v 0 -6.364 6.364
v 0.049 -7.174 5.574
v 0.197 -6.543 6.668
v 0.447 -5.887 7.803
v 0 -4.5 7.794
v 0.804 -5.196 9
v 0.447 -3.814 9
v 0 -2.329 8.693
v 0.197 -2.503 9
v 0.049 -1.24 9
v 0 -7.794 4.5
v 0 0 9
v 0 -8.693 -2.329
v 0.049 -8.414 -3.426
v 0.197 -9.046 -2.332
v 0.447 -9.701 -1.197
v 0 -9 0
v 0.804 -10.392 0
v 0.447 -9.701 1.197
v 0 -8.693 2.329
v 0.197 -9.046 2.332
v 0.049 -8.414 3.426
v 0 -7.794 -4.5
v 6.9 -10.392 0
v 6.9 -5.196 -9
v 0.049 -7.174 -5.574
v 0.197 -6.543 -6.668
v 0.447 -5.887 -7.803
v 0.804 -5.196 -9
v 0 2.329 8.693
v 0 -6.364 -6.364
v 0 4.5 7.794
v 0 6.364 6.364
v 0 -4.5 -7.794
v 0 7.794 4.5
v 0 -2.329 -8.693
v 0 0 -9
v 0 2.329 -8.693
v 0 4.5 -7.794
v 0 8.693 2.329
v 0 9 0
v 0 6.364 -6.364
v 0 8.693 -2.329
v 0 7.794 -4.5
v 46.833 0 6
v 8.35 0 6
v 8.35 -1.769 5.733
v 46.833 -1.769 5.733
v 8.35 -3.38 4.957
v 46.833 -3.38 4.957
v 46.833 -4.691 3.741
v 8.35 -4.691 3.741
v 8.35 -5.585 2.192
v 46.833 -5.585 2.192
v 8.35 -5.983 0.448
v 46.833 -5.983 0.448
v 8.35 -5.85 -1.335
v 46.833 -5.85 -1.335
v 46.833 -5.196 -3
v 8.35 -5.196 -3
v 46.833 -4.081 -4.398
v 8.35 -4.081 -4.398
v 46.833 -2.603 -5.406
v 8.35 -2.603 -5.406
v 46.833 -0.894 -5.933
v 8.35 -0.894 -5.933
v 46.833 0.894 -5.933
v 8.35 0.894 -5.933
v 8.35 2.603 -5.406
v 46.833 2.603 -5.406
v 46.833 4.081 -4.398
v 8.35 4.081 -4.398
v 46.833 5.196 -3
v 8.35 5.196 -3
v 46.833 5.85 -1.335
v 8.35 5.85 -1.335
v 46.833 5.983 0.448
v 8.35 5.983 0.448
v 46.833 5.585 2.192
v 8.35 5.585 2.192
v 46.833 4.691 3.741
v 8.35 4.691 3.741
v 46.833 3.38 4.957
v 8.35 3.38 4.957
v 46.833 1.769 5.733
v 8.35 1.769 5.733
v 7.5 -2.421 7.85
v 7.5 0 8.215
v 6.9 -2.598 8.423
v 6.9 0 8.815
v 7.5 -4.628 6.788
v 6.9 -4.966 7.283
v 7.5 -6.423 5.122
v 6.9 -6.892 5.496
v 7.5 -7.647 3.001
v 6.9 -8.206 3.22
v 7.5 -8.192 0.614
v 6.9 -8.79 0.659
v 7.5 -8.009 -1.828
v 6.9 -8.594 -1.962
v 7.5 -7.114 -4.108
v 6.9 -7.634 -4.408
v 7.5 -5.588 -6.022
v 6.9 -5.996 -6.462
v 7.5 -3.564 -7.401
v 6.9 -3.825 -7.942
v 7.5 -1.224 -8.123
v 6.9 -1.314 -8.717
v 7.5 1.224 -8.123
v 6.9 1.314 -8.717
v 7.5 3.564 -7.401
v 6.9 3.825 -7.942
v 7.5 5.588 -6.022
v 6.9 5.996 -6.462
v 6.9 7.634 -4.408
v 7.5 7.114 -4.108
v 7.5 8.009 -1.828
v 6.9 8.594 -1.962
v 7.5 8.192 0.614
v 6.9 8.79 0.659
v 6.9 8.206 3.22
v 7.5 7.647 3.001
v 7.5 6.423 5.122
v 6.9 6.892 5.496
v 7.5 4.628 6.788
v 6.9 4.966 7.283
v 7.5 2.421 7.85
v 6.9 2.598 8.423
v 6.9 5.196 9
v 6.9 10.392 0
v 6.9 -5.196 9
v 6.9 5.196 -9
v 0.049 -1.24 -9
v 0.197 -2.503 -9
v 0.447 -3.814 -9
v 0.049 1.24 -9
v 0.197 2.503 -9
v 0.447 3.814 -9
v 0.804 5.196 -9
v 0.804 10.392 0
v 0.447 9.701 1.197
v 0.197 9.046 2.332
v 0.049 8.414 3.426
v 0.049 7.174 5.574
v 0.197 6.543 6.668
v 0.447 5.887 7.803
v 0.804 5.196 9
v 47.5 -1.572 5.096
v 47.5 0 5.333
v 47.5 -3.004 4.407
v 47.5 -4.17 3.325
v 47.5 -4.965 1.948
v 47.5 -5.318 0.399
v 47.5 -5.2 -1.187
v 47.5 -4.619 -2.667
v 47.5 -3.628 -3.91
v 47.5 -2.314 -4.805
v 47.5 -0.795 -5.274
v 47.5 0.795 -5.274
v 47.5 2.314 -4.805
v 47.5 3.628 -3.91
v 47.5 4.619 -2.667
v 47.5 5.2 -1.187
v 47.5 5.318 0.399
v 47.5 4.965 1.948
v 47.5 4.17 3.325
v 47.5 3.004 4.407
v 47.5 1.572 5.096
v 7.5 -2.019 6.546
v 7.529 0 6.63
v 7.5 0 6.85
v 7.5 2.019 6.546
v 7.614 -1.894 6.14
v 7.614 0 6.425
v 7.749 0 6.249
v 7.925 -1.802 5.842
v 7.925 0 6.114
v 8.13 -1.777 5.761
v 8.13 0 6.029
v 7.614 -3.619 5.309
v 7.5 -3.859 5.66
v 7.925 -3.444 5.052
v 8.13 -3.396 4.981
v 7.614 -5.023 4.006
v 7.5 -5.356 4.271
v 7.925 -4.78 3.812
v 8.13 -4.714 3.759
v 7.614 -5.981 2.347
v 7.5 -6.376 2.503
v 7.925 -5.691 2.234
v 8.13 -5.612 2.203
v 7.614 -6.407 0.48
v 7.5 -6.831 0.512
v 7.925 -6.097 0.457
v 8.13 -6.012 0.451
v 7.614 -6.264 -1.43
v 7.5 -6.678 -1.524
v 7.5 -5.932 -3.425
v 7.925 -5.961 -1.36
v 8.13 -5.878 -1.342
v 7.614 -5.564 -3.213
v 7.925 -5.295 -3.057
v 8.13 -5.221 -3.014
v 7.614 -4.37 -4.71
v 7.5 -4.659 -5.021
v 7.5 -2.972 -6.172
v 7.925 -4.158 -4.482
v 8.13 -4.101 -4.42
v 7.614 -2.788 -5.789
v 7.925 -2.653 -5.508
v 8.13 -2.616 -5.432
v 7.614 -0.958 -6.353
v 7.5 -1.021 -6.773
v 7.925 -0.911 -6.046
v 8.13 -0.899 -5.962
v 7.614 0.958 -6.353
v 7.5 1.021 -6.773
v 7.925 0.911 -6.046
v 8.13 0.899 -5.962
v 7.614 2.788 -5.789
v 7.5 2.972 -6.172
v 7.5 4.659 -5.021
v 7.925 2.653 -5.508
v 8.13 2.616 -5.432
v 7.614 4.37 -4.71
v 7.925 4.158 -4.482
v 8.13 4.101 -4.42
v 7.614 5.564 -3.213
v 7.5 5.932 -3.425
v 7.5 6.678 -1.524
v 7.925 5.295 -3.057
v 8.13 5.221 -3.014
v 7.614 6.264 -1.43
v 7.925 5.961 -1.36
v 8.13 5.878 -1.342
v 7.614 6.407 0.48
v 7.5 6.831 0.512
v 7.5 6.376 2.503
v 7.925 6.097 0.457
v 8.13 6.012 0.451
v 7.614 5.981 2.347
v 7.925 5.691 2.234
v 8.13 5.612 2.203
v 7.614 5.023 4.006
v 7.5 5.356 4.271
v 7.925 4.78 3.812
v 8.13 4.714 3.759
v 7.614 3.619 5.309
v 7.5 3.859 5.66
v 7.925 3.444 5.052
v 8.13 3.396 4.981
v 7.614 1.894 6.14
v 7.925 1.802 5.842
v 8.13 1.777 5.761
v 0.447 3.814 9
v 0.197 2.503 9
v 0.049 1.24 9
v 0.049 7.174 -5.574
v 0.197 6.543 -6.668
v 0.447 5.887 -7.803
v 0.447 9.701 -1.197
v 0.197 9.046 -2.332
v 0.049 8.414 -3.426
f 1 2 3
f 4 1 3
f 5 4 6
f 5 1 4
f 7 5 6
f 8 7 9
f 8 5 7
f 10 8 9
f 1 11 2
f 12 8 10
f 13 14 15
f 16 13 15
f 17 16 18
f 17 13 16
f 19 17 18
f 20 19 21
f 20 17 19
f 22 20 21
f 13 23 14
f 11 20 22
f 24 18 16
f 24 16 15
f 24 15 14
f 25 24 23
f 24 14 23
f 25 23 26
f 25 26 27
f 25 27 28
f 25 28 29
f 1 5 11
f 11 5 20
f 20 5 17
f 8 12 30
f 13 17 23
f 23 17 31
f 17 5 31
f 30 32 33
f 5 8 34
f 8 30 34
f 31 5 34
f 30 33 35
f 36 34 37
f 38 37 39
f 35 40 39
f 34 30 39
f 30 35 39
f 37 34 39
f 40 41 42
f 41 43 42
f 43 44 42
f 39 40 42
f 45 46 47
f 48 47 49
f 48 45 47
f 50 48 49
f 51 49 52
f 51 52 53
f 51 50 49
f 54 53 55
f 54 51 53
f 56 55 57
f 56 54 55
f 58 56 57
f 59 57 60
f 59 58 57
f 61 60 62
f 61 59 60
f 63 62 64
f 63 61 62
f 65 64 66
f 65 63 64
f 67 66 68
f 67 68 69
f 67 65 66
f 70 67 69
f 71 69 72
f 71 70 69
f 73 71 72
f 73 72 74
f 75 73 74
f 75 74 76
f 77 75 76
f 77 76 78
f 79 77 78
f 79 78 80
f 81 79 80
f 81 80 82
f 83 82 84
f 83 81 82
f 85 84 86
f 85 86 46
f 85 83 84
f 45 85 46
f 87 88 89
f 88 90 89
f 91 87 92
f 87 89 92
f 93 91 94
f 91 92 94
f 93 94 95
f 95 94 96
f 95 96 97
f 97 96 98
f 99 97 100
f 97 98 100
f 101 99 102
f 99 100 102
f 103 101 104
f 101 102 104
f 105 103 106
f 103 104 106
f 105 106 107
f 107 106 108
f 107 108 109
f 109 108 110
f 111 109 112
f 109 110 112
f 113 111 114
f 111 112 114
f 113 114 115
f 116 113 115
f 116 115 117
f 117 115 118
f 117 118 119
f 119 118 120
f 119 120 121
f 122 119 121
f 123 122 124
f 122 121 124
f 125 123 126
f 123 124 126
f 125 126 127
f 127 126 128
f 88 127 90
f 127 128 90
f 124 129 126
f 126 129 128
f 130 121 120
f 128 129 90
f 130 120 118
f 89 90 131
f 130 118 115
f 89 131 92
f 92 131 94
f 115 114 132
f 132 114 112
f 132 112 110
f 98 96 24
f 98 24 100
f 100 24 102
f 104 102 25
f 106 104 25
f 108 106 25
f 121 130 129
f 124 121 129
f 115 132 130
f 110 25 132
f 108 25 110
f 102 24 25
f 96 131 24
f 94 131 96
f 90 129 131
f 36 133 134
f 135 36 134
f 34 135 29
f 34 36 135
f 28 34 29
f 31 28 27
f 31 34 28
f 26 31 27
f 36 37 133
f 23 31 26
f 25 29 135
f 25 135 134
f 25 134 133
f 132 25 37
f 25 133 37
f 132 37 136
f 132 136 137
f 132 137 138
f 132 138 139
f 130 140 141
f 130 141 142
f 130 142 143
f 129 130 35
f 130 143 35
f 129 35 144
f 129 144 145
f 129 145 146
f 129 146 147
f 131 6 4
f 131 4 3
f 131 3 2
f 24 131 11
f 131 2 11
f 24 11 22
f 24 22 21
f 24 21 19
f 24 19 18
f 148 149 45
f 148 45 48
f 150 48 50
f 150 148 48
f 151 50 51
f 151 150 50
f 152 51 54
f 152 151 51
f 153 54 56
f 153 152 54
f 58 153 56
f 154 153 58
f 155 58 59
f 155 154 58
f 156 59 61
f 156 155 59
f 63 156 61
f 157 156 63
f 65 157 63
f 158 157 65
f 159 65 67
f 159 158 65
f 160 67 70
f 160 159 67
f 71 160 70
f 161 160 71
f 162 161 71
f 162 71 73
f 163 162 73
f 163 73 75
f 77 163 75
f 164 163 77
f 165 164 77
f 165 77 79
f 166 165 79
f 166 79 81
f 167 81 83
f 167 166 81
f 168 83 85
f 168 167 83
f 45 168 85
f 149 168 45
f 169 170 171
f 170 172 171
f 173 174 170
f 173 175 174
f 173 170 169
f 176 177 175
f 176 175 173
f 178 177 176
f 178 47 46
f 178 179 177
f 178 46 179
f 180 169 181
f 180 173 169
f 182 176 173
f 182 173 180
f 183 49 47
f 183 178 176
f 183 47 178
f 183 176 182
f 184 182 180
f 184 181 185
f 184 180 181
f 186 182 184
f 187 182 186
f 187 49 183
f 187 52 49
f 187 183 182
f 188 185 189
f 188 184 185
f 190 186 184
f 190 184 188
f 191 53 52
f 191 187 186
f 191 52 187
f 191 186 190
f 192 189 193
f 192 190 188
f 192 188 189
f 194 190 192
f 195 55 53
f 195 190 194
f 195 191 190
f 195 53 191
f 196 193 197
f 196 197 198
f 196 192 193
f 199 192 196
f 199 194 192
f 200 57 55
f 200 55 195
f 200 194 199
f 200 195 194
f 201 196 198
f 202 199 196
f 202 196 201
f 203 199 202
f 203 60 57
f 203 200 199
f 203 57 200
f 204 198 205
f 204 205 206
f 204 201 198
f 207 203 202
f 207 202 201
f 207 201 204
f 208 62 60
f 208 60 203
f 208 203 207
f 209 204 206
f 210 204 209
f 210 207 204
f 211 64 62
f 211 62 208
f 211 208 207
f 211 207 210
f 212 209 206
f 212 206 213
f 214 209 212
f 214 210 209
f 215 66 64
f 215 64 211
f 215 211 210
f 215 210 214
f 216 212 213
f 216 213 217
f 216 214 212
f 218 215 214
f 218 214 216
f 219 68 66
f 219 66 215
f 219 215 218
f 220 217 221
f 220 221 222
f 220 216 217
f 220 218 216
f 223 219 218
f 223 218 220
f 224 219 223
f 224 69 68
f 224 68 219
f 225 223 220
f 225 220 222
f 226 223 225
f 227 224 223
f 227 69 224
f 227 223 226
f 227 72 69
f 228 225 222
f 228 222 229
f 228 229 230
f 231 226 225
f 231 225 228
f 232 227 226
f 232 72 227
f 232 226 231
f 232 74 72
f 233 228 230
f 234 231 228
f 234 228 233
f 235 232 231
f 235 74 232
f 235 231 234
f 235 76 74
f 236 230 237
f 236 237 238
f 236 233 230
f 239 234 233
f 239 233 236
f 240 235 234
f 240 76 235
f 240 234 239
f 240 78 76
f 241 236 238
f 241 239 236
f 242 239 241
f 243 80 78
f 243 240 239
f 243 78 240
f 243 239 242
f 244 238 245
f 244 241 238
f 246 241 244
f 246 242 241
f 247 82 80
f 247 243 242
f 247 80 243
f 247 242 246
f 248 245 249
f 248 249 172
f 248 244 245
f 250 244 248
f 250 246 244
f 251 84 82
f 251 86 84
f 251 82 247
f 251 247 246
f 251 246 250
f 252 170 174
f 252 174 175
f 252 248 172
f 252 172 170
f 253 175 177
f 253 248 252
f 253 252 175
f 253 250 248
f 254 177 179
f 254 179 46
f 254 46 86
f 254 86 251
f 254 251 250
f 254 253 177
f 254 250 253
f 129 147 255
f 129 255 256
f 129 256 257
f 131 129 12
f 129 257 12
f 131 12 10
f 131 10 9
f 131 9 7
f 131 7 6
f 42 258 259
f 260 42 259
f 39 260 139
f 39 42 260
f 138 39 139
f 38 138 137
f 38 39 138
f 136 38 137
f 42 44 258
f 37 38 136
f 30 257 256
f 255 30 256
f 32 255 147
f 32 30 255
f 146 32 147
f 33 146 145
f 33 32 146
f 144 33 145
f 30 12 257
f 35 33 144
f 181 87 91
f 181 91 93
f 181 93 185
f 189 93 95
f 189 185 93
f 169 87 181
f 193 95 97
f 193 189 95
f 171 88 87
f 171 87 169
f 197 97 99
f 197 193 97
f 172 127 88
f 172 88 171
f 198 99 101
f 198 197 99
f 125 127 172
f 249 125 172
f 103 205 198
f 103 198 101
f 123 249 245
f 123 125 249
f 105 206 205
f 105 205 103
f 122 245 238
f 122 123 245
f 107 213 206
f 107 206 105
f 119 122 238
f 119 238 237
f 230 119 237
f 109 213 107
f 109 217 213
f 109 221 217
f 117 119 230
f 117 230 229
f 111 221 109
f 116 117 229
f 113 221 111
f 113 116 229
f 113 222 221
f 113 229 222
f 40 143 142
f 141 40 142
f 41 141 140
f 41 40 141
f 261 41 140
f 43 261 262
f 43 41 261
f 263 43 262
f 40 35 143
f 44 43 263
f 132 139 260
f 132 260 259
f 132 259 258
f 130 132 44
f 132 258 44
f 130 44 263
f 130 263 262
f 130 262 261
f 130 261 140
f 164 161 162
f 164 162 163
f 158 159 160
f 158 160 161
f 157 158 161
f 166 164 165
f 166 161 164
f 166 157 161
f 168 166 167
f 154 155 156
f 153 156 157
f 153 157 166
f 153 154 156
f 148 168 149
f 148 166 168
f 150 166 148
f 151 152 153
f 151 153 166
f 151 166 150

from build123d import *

# Parameters (mm, degrees)
EXTRUDE_1_DEPTH     = 7.5
SKETCH_4_R          = 20.03
SKETCH_4_R_2        = 9
CUT_EXTRUDE_1_DEPTH = 0.9375
CUT_EXTRUDE_1_DRAFT = -60
CHAMFER_2_SIZE      = 0.666666667


with BuildPart() as part:
    # 草图3 → 凸台-拉伸1 (new body)
    with BuildSketch(Plane(origin=(0, 0, 0), x_dir=(0, 0, -1), z_dir=(1, 0, 0))):
        Polygon((9, 5.196152423), (0, 10.392304845), (-9, 5.196152423), (-9, -5.196152423), (0, -10.392304845), (9, -5.196152423), align=None)
    extrude(amount=EXTRUDE_1_DEPTH)


with BuildPart() as cut_extrude_1_tool:
    # 草图4 → 切除-拉伸1 (with draft: the straight prism first)
    with BuildSketch(Plane.ZY):
        Circle(SKETCH_4_R)
        Circle(SKETCH_4_R_2, mode=Mode.SUBTRACT)
    extrude(amount=-CUT_EXTRUDE_1_DEPTH)
    # 切除-拉伸1: the draft: its side faces are tilted about the plane it starts from
    cut_extrude_1_sides = [cut_extrude_1_tool.faces().sort_by_distance(p)[0] for p in [
        (0.46875, 0, -20.03),
        (0.46875, 0, -9),
    ]]
    draft(cut_extrude_1_sides, Plane.ZY, CUT_EXTRUDE_1_DRAFT)


with BuildPart() as part_1:
    add(part.part)

    # 切除-拉伸1: cut by cut_extrude_1_tool
    add(cut_extrude_1_tool.part, mode=Mode.SUBTRACT)

    # 草图5 → 旋转1 (revolve)
    with BuildSketch(Plane.XY, mode=Mode.PRIVATE) as revolve_1_sk:
        with BuildLine():
            Line((8.35, 6), (47.5, 6))
            Line((47.5, 6), (47.5, 0))
            Line((47.5, 0), (7.5, 0))
            Line((7.5, 0), (7.5, 6.85))
            ThreePointArc((7.5, 6.85), (7.748959236, 6.248959236), (8.35, 6))
        make_face()
    revolve(revolve_1_sk.sketch.rotate(Axis((7.5, 0, 0), (1, 0, 0)), 90), axis=Axis((7.5, 0, 0), (1, 0, 0)))

    # 倒角2
    chamfer_2_edges = [part_1.edges().sort_by_distance(p)[0] for p in [
        (47.5, 0, -6),
    ]]
    chamfer(chamfer_2_edges, length=CHAMFER_2_SIZE)

    # 草图7 → 切除-旋转1 (revolve, cut)
    with BuildSketch(Plane.XY, mode=Mode.PRIVATE) as cut_revolve_1_sk:
        Polygon((7.5, 8.215), (6.9, 8.815), (6.9, 20.03), (7.5, 20.03), align=None)
    revolve(cut_revolve_1_sk.sketch.rotate(Axis((0, 0, 0), (1, 0, 0)), 90), axis=Axis((0, 0, 0), (1, 0, 0)), mode=Mode.SUBTRACT)


solid = part_1.part
